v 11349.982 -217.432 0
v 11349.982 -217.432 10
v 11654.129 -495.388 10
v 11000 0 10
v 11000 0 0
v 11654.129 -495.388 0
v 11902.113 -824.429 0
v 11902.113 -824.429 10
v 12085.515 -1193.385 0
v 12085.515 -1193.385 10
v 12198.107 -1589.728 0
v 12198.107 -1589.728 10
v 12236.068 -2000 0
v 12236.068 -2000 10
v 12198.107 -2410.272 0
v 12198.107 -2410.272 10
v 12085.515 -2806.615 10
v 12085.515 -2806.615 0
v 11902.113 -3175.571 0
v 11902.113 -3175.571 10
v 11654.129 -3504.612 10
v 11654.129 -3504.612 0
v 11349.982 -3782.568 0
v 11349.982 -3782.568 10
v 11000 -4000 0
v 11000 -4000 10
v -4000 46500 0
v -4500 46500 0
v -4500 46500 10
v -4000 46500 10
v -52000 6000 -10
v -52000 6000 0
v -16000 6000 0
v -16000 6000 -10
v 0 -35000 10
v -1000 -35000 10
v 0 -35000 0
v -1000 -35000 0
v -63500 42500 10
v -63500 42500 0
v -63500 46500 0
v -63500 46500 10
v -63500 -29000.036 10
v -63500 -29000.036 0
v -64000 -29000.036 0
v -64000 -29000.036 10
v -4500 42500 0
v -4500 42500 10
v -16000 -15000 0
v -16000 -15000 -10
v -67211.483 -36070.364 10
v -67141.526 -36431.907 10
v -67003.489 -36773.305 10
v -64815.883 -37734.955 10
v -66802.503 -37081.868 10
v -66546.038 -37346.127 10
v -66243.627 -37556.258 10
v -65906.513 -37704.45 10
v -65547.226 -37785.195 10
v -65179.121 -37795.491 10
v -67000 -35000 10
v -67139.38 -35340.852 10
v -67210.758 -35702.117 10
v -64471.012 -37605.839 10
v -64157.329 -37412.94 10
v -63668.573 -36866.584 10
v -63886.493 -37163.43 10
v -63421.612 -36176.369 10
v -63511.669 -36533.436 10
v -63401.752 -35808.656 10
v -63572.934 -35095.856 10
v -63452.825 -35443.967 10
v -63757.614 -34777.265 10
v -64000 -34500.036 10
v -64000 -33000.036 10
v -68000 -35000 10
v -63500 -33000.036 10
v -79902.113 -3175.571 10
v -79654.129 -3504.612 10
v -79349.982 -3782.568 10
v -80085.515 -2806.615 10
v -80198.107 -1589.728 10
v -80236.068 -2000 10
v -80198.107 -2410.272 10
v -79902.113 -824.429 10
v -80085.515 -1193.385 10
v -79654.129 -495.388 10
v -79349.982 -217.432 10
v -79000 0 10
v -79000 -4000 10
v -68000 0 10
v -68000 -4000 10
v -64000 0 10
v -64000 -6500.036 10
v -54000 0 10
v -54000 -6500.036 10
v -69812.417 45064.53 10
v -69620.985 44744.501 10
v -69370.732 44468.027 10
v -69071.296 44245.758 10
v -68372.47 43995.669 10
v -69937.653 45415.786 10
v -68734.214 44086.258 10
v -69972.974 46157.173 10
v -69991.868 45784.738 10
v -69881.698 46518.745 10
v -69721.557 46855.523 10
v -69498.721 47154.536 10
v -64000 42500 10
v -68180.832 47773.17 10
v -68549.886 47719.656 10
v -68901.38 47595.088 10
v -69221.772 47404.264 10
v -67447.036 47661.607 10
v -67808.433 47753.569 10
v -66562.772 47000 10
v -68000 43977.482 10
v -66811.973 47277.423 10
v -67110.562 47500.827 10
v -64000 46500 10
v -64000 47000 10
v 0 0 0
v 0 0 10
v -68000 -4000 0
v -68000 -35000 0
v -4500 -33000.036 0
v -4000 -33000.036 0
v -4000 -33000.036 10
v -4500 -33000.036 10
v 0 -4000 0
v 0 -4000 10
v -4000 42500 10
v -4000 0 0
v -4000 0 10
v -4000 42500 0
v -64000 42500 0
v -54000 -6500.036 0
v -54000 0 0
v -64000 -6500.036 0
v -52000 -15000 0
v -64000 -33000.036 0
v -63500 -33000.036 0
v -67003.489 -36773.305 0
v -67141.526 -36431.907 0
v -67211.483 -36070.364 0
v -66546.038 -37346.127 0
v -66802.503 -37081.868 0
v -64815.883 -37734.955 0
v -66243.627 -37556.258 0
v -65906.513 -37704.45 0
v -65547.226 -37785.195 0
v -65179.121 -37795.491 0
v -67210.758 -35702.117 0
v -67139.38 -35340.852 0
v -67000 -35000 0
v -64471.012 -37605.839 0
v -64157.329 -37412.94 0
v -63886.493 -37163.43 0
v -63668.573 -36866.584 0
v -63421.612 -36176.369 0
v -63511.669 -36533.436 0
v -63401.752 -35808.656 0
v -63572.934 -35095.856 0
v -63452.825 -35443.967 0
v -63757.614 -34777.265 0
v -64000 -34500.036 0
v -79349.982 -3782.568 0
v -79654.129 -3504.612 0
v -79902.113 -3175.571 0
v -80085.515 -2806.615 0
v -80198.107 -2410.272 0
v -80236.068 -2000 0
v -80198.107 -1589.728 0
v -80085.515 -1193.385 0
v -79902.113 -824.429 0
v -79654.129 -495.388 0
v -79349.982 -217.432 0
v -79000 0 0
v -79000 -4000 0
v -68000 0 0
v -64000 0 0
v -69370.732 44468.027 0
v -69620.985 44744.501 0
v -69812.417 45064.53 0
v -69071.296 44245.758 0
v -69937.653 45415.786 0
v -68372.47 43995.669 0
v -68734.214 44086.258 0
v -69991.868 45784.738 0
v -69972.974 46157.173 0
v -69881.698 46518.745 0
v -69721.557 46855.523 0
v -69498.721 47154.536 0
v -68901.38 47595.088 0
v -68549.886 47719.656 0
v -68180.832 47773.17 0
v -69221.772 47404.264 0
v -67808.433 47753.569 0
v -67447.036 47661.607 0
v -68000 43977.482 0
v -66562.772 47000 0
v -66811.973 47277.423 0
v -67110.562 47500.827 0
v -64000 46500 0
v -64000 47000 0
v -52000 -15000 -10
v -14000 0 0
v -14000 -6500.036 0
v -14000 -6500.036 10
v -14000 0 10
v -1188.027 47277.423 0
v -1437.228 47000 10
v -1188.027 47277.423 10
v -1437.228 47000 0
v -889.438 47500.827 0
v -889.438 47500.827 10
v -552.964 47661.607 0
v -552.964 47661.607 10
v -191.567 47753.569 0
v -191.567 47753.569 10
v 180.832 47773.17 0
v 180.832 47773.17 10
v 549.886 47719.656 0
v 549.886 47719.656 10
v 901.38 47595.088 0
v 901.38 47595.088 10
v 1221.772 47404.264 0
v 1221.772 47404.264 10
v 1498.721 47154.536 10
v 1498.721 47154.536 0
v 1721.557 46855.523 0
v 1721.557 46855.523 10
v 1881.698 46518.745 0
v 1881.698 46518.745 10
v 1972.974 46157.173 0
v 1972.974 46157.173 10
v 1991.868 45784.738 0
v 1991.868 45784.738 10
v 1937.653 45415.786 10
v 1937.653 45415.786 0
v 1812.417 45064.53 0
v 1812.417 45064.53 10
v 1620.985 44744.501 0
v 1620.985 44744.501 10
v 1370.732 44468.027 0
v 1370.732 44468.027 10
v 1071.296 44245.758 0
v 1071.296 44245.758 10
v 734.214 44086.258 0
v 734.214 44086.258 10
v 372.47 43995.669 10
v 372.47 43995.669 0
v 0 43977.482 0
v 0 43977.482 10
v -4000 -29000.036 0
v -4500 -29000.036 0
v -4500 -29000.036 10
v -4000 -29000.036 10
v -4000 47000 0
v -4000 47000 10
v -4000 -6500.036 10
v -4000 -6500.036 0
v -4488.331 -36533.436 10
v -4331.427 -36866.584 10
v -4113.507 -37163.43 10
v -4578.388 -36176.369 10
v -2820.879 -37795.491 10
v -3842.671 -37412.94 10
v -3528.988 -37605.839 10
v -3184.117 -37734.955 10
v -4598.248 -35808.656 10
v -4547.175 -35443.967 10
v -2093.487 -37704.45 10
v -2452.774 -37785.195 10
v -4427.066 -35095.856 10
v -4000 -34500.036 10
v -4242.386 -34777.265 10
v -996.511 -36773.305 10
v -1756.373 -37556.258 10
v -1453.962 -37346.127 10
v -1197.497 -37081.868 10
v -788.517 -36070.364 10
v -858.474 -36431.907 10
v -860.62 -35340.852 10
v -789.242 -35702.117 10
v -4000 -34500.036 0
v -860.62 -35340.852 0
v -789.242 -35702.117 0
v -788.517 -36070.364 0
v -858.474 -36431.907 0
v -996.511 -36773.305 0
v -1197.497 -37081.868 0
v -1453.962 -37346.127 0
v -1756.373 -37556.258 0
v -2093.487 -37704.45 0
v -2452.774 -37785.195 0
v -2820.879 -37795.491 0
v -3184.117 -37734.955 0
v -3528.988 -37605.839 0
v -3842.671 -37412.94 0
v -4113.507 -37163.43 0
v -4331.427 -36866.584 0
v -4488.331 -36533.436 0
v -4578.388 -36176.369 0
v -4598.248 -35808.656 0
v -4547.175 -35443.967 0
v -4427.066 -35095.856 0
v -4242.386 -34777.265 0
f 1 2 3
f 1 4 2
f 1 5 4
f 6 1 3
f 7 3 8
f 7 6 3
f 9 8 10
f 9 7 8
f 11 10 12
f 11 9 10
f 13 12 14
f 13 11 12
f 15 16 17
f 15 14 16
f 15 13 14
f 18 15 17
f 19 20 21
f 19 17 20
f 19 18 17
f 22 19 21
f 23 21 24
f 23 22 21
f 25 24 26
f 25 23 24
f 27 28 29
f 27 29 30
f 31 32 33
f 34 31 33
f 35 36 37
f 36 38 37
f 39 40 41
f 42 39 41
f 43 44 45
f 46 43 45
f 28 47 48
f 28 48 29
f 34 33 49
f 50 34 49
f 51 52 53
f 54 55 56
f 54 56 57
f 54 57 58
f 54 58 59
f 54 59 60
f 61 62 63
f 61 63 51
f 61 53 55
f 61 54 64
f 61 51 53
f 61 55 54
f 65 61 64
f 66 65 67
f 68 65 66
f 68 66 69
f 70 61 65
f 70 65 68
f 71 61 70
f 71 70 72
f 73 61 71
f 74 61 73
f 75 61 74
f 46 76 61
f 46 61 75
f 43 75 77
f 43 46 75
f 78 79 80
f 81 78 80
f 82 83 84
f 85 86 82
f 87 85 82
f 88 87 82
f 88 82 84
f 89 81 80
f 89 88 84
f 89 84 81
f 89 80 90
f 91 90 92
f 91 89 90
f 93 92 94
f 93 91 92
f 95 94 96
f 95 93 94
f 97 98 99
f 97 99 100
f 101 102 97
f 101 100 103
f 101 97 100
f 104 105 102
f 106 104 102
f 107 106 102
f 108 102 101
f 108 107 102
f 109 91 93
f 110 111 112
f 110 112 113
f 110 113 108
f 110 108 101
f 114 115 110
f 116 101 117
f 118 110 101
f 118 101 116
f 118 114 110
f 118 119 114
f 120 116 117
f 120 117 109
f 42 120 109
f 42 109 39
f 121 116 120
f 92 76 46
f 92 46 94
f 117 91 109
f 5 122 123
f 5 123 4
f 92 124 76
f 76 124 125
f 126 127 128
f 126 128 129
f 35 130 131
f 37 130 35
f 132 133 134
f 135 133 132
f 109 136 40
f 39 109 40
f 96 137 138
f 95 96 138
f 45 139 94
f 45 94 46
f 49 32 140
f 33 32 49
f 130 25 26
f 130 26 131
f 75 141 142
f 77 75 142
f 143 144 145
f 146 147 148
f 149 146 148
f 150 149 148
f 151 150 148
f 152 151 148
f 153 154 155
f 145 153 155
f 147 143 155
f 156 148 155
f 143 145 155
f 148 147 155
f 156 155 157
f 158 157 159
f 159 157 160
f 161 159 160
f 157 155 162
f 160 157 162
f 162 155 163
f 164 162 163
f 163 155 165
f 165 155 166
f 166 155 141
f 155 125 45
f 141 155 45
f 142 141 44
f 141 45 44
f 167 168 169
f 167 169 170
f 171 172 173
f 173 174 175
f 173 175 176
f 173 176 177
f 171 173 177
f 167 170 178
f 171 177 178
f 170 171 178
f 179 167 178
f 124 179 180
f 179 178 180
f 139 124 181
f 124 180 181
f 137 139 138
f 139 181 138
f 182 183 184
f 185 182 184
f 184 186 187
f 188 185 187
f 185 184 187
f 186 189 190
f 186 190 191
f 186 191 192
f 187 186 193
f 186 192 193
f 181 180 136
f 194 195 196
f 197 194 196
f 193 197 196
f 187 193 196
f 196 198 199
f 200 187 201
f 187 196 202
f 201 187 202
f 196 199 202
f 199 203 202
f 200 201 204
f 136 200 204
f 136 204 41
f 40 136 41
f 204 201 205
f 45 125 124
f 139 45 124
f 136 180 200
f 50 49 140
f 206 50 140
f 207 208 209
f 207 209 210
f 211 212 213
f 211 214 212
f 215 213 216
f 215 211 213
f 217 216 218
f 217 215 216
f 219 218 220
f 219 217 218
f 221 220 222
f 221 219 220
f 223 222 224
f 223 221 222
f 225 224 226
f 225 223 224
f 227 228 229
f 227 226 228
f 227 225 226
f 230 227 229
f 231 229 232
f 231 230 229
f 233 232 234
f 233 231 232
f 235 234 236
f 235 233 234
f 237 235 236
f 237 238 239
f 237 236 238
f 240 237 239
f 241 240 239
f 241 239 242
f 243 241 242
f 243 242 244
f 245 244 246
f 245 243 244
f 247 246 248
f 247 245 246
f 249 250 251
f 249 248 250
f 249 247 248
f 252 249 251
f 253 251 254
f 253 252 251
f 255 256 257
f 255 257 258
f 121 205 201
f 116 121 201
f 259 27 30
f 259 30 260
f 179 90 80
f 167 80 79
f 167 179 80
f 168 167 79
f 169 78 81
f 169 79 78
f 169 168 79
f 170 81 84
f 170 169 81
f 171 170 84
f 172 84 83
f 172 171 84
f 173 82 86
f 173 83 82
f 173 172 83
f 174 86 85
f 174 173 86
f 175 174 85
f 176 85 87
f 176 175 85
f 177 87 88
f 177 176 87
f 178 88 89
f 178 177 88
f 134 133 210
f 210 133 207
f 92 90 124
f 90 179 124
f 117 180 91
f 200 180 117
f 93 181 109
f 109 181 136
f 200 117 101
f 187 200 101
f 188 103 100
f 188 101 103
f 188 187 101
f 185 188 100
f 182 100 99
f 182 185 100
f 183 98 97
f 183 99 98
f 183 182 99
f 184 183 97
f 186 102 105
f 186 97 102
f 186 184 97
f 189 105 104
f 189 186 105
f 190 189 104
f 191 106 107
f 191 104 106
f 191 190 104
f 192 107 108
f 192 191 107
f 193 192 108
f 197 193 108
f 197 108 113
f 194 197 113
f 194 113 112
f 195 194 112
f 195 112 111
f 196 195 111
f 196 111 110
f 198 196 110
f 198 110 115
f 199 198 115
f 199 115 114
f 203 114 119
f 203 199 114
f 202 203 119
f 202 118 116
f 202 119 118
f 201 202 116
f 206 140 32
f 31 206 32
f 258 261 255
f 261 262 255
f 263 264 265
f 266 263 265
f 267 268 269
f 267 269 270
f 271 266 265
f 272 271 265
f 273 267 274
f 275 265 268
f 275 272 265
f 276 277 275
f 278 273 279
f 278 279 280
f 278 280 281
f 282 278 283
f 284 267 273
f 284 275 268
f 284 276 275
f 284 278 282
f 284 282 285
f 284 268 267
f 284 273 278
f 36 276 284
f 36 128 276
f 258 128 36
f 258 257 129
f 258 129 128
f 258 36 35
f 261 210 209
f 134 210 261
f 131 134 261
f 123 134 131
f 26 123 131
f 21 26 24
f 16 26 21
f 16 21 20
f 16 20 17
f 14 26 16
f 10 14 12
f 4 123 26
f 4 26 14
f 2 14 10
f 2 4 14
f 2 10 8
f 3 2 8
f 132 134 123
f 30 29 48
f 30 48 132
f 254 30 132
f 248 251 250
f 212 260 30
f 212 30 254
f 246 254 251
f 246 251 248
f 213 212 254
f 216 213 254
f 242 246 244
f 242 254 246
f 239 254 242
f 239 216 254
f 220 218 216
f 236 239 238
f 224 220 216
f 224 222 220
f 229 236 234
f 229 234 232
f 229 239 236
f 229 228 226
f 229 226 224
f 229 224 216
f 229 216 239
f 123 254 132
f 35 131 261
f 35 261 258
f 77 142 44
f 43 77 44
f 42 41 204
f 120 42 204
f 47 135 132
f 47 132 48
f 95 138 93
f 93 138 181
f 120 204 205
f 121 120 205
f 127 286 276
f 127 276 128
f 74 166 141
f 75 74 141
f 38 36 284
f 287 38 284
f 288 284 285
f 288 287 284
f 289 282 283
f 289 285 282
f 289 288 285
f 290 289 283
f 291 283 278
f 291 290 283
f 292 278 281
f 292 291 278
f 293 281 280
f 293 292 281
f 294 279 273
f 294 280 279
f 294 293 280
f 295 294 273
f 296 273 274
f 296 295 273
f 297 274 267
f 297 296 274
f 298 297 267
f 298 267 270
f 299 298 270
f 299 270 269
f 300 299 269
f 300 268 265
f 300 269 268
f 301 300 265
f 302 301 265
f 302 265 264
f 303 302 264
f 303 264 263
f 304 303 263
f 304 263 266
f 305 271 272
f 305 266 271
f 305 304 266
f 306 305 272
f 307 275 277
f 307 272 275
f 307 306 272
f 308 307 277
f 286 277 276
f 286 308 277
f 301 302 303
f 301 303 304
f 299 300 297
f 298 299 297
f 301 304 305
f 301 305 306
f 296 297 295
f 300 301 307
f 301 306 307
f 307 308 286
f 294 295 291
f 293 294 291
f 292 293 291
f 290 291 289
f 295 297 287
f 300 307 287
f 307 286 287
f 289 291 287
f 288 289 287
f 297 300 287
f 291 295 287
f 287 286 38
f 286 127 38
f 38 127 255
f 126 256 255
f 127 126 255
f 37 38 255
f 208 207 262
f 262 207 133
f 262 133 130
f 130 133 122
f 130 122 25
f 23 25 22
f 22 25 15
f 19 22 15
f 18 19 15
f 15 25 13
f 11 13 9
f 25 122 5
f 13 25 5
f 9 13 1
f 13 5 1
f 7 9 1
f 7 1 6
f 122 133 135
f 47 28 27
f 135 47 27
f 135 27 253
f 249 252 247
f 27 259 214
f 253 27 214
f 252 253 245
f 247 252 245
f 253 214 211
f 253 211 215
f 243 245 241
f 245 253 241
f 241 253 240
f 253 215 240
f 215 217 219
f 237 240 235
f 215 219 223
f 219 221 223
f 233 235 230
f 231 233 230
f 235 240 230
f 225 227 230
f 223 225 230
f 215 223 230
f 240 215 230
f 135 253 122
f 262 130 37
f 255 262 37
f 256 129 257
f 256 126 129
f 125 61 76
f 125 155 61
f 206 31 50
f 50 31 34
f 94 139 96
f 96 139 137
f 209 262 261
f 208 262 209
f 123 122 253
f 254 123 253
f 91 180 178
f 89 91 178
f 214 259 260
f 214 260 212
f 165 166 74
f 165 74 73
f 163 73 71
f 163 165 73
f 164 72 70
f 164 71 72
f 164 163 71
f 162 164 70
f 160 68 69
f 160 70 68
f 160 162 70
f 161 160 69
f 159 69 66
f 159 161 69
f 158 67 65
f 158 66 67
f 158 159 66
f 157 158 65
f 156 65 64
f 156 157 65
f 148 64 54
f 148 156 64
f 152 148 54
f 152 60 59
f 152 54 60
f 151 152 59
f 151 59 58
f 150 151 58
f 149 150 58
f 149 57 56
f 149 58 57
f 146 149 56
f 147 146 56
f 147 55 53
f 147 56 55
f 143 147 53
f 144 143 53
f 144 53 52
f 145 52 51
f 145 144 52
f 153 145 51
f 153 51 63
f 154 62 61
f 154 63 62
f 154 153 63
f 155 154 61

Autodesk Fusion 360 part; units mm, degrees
sketch "スケッチ1" plane through (0, 0, 0) normal (0, 0, 1) x (1, 0, 0)
  line L0 (10000, 0) -> (11000, 0)
  line L1 (11000, -4000) -> (0, -4000)
  line L2 (-63500, -29000.036) -> (-64000, -29000.036)
  line L3 (-63500, 42500) -> (-63500, 46500)
  line L4 (-54000, -6500.036) -> (-54000, -4000)
  line L5 (-64000, -34500.036) -> (-64000, -33000.036)
  line L6 (-34000, 2000) -> (-34000, 0)
  arc A0 (-79000, 0) -> (-79000, -4000) centre (-78000, -2000) ccw
  line L7 (-67000, -35000) -> (-68000, -35000)
  arc A1 (0, 43977.4822) -> (-1437.2284, 47000) centre (94.0203, 45875.1545) ccw
  line L8 (-64000, -6500.036) -> (-64000, -29000.036)
  line L9 (-64000, 42500) -> (-63500, 42500)
  line L10 (0, 41000) -> (0, 43977.4822)
  line L11 (-4500, -33000.036) -> (-4500, -29000.036)
  arc A2 (-67000, -35000) -> (-64000, -34500.036) centre (-65310.0198, -35889.9814) ccw
  arc A3 (-66562.7716, 47000) -> (-68000, 43977.4822) centre (-68094.0203, 45875.1545) ccw
  arc A4 (11000, -4000) -> (11000, 0) centre (10000, -2000) ccw
  line L12 (-79000, -4000) -> (-68000, -4000)
  line L13 (-68000, 41000) -> (-68000, 43977.4822)
  line L14 (11000, -4000) -> (0, -4000)
  line L15 (-1000, -35000) -> (0, -35000)
  line L16 (-64000, 46500) -> (-64000, 47000)
  line L17 (-64000, 0) -> (-64000, 42500)
  line L18 (-4000, 47000) -> (-1437.2284, 47000)
  line L19 (-78000, 0) -> (-79000, 0)
  line L20 (-68000, 0) -> (-78000, 0)
  line L21 (-4000, 0) -> (-4000, 42500)
  line L22 (-64000, -6500.036) -> (-54000, -6500.036)
  line L23 (-14000, -6500.036) -> (-14000, -4000)
  line L24 (-68000, 0) -> (-68000, 41000)
  line L25 (-63500, -33000.036) -> (-63500, -29000.036)
  line L26 (-4000, -6500.036) -> (-14000, -6500.036)
  line L27 (-4000, -33000.036) -> (-4500, -33000.036)
  line L28 (-4000, 42500) -> (-4500, 42500)
  line L29 (-68000, -4000) -> (-68000, -35000)
  line L30 (11000, 0) -> (0, 0)
  line L31 (-64000, -33000.036) -> (-63500, -33000.036)
  line L32 (0, -4000) -> (0, -35000)
  line L33 (-4500, 46500) -> (-4000, 46500)
  line L34 (-4000, 46500) -> (-4000, 47000)
  line L35 (0, 0) -> (10000, 0)
  line L36 (-64000, 47000) -> (-66562.7716, 47000)
  line L37 (-63500, 46500) -> (-64000, 46500)
  line L38 (-4000, -34500.036) -> (-4000, -33000.036)
  line L39 (-4000, -6500.036) -> (-4000, -29000.036)
  line L40 (-4500, -29000.036) -> (-4000, -29000.036)
  line L41 (-4500, 42500) -> (-4500, 46500)
  arc A5 (-4000, -34500.036) -> (-1000, -35000) centre (-2689.9802, -35889.9814) ccw
  line L42 (0, 0) -> (0, 41000)
  line L43 (-54000, -4000) -> (-54000, 0)
  line L44 (-54000, 0) -> (-64000, 0)
  line L45 (-4000, 0) -> (-14000, 0)
  line L46 (-14000, 0) -> (-14000, -4000)
  line L47 (-52000, 6000) -> (-16000, 6000)
  line L48 (-16000, 6000) -> (-16000, -15000)
  line L49 (-16000, -15000) -> (-52000, -15000)
  line L50 (-52000, -15000) -> (-52000, 6000)
  point P0 (-64000, 42500)
  point P1 (-64000, -6500.036)
  point P2 (-64000, 0)
  point P3 (-64000, -34500.036)
  point P4 (-68000, 0)
  point P5 (-64000, -35000)
  point P6 (-4000, 0)
  point P7 (-64000, 41000)
  point P8 (-4000, -35000)
  point P9 (-4000, 41000)
  point P10 (-4000, -6500.036)
  point P11 (-64000, 0)
  point P12 (-4000, 42500)
  point P13 (-4000, -34500.036)
extrude "押し出し1" add sketch "スケッチ1" along normal blind 10 contours L0 L1 A1 L10 L11 A4 L14 L15 L18 L21 L23 L26 L27 L28 L30 L32 L33 L34 L35 L38 L39 L40 L41 A5 L42 L45 L46 | L2 L3 L4 L5 A0 L7 L8 L9 A2 A3 L12 L13 L16 L17 L19 L20 L22 L24 L25 L29 L31 L36 L37 L43 L44 makes body 1 at (-10666.6667, -2166.6787, 10) makes body 2 at (-57333.3333, -4333.3573, 0)
extrude "押し出し2" add sketch "スケッチ1" against normal blind 10 separate body contours L47 L48 L49 L50 makes body 3
